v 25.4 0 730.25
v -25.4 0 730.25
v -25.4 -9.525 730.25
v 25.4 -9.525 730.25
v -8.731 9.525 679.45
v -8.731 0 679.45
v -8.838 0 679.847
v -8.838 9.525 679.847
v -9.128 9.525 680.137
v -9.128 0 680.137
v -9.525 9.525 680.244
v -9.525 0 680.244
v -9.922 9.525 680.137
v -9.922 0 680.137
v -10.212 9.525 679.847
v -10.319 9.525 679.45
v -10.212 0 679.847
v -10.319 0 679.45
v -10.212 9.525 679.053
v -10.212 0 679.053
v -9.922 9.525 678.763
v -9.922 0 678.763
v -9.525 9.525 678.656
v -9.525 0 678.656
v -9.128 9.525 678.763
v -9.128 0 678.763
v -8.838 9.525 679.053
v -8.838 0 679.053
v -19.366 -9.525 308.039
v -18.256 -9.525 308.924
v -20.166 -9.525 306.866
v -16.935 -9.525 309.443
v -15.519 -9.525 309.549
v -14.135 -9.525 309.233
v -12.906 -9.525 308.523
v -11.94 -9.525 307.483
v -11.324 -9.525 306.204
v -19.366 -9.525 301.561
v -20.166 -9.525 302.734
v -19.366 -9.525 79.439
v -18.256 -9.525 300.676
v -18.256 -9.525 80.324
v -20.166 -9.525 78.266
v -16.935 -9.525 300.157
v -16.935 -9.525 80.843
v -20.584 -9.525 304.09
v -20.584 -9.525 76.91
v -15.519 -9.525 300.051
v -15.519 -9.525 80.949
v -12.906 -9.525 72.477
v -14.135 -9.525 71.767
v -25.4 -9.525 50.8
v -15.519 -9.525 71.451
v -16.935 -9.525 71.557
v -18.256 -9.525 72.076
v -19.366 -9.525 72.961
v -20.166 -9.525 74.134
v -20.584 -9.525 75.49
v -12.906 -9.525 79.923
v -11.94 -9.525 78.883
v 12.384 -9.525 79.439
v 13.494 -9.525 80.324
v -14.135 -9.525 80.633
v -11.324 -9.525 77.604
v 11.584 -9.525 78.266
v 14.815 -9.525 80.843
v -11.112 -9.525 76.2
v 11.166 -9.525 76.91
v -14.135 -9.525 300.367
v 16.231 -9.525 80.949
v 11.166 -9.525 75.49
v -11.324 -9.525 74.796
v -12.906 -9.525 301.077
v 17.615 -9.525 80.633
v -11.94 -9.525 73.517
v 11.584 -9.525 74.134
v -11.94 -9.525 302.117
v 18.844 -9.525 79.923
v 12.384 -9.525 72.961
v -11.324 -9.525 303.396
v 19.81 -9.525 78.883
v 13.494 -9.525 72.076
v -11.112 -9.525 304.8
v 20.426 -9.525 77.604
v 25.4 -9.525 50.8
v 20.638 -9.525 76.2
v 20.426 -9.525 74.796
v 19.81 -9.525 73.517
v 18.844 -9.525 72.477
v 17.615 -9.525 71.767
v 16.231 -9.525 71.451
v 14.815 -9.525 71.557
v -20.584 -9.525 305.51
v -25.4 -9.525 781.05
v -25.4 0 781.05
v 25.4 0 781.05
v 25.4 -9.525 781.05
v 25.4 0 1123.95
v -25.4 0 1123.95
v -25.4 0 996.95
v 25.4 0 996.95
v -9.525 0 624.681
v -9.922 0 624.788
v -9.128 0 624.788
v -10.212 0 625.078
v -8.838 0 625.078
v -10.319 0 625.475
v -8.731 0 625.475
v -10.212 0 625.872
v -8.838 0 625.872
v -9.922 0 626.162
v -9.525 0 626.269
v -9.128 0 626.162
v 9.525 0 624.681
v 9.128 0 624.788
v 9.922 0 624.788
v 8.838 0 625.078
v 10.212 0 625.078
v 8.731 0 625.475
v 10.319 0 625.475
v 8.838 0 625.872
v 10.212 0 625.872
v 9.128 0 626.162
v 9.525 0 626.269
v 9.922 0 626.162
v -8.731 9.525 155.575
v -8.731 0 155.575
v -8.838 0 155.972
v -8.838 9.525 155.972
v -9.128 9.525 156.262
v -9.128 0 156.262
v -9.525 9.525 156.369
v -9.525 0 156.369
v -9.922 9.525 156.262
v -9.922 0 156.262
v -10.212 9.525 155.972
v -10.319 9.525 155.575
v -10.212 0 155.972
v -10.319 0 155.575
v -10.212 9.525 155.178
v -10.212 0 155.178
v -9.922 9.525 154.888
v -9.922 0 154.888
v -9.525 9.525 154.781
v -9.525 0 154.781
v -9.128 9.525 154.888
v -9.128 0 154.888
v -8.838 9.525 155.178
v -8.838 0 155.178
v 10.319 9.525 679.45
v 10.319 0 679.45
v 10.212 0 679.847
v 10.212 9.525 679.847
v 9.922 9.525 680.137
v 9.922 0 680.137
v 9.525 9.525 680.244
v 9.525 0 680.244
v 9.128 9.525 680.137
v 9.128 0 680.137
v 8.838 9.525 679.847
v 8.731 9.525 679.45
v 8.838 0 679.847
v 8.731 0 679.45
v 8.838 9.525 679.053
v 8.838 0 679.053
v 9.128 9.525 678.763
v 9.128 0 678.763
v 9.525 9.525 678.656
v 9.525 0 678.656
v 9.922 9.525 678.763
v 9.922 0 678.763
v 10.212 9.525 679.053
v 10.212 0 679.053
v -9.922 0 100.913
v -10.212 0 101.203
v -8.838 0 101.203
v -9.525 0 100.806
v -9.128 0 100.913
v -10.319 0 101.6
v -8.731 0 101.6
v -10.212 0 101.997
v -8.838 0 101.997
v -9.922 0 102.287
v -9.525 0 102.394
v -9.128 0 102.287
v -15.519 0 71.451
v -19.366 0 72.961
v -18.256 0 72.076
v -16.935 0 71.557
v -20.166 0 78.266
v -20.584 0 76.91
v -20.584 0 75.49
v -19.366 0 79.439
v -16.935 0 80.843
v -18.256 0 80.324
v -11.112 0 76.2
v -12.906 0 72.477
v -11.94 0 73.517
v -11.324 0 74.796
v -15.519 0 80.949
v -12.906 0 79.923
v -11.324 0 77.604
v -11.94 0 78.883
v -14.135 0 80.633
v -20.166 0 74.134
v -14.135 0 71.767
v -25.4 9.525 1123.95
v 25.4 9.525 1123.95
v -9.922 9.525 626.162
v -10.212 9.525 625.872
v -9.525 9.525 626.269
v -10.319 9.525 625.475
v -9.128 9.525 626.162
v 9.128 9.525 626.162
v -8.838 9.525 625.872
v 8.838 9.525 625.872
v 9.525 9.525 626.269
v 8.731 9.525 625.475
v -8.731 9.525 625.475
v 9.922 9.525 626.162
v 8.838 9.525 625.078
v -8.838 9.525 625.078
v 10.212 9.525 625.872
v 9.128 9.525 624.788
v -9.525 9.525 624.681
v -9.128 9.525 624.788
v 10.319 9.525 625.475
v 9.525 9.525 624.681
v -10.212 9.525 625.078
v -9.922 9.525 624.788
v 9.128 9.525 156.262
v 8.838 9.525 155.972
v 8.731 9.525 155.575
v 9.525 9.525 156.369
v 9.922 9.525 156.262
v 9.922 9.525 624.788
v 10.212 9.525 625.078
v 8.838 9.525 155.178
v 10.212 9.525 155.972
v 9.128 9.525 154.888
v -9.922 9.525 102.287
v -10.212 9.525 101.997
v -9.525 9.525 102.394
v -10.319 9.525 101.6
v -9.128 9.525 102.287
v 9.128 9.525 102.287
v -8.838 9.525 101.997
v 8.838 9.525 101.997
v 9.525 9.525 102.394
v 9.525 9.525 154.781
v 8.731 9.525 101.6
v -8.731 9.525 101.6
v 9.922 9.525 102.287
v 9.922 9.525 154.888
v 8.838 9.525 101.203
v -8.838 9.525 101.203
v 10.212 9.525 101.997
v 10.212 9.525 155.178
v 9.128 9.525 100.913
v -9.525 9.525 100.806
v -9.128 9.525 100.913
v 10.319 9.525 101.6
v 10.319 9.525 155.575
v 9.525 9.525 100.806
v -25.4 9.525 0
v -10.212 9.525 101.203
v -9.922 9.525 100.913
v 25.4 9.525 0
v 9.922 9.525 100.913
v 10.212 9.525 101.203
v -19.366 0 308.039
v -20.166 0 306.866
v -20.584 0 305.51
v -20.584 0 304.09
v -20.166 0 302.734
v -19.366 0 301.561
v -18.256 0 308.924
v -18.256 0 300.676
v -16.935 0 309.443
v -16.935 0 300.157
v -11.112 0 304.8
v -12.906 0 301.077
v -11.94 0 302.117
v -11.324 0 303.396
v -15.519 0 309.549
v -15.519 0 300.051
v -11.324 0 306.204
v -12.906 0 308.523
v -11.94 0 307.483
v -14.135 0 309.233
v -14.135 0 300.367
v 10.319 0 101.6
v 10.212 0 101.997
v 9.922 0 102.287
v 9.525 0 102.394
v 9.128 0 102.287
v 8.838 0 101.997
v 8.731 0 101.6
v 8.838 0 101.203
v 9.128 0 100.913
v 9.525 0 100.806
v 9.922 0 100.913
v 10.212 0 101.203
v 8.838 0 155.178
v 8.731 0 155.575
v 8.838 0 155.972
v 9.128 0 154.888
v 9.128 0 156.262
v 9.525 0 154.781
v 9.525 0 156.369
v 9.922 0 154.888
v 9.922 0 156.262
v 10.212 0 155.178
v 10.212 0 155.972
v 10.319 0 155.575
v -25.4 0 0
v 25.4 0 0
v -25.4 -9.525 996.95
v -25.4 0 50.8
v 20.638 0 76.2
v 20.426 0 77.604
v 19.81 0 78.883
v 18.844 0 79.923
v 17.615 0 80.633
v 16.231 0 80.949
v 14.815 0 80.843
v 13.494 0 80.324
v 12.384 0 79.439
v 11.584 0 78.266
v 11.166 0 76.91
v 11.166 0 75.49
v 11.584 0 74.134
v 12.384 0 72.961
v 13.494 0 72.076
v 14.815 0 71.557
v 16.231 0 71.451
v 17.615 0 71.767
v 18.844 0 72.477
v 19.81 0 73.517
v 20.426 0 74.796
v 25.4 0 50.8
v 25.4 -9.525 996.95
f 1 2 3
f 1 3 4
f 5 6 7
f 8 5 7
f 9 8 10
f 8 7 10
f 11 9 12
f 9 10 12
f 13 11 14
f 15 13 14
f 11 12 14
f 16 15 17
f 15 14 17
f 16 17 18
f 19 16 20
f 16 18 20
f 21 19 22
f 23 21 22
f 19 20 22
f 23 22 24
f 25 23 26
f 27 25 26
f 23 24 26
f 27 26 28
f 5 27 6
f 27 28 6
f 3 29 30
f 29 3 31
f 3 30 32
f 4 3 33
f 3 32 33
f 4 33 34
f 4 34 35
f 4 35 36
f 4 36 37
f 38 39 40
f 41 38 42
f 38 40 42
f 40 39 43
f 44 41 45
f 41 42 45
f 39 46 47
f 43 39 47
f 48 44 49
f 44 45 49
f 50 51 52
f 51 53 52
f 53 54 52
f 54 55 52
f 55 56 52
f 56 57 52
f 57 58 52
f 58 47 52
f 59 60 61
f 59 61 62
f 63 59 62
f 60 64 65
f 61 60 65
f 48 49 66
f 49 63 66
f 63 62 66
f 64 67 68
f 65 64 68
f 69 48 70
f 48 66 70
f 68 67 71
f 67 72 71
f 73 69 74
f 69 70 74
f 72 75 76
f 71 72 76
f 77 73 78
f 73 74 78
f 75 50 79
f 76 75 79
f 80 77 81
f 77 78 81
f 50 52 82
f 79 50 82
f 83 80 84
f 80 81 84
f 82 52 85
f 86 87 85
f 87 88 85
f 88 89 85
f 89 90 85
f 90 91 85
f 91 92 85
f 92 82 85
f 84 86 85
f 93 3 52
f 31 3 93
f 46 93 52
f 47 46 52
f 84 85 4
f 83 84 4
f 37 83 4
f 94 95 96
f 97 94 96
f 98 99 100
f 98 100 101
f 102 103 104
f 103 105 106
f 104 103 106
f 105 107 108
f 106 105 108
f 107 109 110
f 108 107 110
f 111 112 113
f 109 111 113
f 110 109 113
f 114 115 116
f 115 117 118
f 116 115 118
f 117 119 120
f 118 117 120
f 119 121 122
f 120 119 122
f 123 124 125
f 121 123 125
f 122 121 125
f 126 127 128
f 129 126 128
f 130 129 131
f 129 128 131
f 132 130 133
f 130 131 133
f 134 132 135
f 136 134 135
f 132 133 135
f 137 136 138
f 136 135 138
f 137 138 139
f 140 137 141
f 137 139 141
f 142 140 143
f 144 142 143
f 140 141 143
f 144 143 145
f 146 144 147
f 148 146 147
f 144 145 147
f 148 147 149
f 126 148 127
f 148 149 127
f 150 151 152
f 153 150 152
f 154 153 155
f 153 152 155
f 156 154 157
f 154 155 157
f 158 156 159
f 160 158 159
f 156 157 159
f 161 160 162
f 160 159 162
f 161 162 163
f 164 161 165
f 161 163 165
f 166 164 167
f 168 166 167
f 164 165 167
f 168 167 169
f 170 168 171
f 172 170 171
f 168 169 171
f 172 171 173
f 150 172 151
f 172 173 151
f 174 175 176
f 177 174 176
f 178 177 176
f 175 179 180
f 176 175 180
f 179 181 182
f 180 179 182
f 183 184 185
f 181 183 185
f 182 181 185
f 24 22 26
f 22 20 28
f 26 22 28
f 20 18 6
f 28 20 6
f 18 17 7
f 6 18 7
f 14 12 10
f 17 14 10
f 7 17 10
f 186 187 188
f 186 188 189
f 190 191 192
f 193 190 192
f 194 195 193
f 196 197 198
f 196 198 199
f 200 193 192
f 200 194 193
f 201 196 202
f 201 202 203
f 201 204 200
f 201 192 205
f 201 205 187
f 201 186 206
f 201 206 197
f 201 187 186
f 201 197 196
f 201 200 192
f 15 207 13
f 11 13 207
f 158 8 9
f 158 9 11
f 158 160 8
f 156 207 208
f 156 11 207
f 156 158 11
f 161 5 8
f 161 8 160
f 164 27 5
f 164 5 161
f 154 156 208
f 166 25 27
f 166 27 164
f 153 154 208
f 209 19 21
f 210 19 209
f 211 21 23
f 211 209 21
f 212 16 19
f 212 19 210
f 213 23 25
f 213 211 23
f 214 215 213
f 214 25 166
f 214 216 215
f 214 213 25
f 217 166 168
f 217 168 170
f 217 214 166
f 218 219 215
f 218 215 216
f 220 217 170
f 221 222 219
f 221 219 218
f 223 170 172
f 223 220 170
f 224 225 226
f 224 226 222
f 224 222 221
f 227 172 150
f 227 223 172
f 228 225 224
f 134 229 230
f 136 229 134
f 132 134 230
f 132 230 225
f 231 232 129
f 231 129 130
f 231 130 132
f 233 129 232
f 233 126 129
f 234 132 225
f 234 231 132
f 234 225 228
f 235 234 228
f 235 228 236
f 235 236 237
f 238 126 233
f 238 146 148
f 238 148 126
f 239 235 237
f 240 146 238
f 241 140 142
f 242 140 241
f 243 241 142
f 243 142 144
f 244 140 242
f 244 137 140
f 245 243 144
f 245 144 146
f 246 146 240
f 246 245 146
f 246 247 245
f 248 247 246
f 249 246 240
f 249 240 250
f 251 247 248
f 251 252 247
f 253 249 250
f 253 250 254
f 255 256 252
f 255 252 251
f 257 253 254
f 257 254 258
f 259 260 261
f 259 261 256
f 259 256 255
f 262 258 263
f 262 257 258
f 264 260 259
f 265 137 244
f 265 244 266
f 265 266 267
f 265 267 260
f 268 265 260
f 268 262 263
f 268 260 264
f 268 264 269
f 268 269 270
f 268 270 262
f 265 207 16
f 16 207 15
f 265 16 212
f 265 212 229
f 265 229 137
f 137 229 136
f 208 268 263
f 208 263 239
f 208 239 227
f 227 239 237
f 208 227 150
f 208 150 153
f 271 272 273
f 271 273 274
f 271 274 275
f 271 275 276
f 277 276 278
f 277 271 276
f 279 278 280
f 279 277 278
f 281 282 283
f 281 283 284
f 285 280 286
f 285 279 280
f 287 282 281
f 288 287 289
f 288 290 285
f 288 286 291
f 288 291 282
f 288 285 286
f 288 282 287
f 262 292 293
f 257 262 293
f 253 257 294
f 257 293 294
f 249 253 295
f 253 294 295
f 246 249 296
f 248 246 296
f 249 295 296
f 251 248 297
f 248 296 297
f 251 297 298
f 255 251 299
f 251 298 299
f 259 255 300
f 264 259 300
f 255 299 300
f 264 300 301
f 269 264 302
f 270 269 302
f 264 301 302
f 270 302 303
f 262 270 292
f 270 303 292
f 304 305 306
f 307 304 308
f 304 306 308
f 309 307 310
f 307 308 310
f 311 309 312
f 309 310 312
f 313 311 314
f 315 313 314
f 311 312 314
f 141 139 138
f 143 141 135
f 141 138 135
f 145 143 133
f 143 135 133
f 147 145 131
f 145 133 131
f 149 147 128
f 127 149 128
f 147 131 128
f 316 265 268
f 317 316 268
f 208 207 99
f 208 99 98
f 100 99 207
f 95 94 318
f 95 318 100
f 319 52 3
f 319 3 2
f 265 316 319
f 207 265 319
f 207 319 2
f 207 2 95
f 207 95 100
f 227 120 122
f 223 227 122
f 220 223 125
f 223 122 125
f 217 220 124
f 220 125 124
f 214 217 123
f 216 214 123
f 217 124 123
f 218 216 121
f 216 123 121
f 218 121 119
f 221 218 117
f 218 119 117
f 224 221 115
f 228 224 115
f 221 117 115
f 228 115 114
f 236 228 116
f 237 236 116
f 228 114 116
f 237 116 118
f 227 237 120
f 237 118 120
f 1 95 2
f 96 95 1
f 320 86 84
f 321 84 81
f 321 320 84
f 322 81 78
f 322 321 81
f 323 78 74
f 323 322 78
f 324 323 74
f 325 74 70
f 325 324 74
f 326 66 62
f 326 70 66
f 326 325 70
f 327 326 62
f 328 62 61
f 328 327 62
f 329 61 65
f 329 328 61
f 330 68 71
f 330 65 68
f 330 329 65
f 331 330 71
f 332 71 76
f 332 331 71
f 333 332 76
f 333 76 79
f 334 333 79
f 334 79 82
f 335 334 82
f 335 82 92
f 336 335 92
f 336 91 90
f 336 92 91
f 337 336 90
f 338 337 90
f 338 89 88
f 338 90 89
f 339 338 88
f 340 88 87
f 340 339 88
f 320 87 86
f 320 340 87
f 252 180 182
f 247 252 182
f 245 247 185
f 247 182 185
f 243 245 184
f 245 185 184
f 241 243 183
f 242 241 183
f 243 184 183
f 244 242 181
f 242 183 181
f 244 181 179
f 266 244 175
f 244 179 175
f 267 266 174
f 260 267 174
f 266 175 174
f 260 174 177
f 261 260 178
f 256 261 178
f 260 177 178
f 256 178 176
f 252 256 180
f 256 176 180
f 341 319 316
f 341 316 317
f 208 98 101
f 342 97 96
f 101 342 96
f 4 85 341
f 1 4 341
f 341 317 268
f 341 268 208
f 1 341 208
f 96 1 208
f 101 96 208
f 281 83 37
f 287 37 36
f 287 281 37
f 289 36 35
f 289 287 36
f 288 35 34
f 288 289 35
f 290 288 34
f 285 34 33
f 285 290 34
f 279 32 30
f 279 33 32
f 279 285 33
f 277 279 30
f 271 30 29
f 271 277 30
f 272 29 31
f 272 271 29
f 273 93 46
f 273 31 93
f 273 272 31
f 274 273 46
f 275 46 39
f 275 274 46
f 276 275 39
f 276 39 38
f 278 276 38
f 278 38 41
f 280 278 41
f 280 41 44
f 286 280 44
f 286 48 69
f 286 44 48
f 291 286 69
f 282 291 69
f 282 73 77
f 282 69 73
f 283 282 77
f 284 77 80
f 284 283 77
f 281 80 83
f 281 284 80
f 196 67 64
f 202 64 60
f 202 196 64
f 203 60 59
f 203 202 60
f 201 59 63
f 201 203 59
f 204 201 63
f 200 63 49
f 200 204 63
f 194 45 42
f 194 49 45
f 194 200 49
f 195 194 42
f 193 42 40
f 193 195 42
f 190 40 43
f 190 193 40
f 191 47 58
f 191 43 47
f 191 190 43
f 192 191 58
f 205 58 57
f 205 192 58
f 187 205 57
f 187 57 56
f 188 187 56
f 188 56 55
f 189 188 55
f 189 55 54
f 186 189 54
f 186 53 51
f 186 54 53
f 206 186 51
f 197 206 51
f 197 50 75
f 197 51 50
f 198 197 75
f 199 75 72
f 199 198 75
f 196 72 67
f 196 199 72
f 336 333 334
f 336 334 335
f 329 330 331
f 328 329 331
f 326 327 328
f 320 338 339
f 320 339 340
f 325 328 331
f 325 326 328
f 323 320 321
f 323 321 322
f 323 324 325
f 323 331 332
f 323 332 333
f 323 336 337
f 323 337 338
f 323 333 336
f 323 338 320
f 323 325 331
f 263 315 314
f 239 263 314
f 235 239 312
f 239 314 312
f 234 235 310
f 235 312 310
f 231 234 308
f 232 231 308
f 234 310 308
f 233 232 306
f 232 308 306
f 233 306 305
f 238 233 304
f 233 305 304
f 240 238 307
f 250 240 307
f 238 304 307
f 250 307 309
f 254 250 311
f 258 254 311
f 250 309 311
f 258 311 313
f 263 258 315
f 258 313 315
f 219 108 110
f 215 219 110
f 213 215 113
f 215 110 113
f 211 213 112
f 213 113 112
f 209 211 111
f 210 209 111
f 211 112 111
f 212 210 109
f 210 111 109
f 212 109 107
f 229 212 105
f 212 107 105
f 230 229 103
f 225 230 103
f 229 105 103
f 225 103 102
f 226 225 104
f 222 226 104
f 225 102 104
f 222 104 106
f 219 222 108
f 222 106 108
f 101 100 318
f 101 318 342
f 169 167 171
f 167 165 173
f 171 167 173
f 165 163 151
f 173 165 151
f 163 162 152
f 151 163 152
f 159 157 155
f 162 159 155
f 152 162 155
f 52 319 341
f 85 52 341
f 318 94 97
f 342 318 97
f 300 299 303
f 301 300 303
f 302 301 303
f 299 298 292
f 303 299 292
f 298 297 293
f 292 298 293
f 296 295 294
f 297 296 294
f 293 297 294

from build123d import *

# Parameters (mm, degrees)
F0_W     = 50.8
F0_H     = 19.05
F1_DEPTH = 1123.95
F2_W     = 122.435573
F2_H     = 50.8
F2_W_2   = 93.867282
F2_W_3   = 343.160421
F2_H_2   = 127
F3_DEPTH = 25.4
F4_R     = 0.79375
F5_DEPTH = 25.4
F6_R     = 4.7625
F7_DEPTH = 25.4


with BuildPart() as f1:
    # F0 (on Top) → F1 (new body)
    with BuildSketch(Plane.XY):
        Rectangle(F0_W, F0_H)
    extrude(amount=F1_DEPTH)

    # F2 (on Front) → F3 (cut)
    with BuildSketch(Plane.XZ):
        with Locations((22.446524, 25.4)):
            Rectangle(F2_W, F2_H)
        with Locations((2.720783, 755.65)):
            Rectangle(F2_W_2, F2_H)
        with Locations((-38.781822, 1060.45)):
            Rectangle(F2_W_3, F2_H_2)
    extrude(amount=F3_DEPTH, mode=Mode.SUBTRACT)

    # F4 (on Front) → F5 (cut)
    with BuildSketch(Plane.XZ):
        with Locations((9.525, 101.6)):
            Circle(F4_R)
        with Locations((9.525, 155.575)):
            Circle(F4_R)
        with Locations((9.525, 625.475)):
            Circle(F4_R)
        with Locations((9.525, 679.45)):
            Circle(F4_R)
        with Locations((-9.525, 625.475)):
            Circle(F4_R)
        with Locations((-9.525, 679.45)):
            Circle(F4_R)
        with Locations((-9.525, 101.6)):
            Circle(F4_R)
        with Locations((-9.525, 155.575)):
            Circle(F4_R)
    extrude(amount=-F5_DEPTH, mode=Mode.SUBTRACT)

    # F6 (on Front) → F7 (cut)
    with BuildSketch(Plane.XZ):
        with Locations((15.875, 76.2)):
            Circle(F6_R)
        with Locations((-15.875, 76.2)):
            Circle(F6_R)
        with Locations((-15.875, 304.8)):
            Circle(F6_R)
    extrude(amount=F7_DEPTH, mode=Mode.SUBTRACT)


solid = f1.part
